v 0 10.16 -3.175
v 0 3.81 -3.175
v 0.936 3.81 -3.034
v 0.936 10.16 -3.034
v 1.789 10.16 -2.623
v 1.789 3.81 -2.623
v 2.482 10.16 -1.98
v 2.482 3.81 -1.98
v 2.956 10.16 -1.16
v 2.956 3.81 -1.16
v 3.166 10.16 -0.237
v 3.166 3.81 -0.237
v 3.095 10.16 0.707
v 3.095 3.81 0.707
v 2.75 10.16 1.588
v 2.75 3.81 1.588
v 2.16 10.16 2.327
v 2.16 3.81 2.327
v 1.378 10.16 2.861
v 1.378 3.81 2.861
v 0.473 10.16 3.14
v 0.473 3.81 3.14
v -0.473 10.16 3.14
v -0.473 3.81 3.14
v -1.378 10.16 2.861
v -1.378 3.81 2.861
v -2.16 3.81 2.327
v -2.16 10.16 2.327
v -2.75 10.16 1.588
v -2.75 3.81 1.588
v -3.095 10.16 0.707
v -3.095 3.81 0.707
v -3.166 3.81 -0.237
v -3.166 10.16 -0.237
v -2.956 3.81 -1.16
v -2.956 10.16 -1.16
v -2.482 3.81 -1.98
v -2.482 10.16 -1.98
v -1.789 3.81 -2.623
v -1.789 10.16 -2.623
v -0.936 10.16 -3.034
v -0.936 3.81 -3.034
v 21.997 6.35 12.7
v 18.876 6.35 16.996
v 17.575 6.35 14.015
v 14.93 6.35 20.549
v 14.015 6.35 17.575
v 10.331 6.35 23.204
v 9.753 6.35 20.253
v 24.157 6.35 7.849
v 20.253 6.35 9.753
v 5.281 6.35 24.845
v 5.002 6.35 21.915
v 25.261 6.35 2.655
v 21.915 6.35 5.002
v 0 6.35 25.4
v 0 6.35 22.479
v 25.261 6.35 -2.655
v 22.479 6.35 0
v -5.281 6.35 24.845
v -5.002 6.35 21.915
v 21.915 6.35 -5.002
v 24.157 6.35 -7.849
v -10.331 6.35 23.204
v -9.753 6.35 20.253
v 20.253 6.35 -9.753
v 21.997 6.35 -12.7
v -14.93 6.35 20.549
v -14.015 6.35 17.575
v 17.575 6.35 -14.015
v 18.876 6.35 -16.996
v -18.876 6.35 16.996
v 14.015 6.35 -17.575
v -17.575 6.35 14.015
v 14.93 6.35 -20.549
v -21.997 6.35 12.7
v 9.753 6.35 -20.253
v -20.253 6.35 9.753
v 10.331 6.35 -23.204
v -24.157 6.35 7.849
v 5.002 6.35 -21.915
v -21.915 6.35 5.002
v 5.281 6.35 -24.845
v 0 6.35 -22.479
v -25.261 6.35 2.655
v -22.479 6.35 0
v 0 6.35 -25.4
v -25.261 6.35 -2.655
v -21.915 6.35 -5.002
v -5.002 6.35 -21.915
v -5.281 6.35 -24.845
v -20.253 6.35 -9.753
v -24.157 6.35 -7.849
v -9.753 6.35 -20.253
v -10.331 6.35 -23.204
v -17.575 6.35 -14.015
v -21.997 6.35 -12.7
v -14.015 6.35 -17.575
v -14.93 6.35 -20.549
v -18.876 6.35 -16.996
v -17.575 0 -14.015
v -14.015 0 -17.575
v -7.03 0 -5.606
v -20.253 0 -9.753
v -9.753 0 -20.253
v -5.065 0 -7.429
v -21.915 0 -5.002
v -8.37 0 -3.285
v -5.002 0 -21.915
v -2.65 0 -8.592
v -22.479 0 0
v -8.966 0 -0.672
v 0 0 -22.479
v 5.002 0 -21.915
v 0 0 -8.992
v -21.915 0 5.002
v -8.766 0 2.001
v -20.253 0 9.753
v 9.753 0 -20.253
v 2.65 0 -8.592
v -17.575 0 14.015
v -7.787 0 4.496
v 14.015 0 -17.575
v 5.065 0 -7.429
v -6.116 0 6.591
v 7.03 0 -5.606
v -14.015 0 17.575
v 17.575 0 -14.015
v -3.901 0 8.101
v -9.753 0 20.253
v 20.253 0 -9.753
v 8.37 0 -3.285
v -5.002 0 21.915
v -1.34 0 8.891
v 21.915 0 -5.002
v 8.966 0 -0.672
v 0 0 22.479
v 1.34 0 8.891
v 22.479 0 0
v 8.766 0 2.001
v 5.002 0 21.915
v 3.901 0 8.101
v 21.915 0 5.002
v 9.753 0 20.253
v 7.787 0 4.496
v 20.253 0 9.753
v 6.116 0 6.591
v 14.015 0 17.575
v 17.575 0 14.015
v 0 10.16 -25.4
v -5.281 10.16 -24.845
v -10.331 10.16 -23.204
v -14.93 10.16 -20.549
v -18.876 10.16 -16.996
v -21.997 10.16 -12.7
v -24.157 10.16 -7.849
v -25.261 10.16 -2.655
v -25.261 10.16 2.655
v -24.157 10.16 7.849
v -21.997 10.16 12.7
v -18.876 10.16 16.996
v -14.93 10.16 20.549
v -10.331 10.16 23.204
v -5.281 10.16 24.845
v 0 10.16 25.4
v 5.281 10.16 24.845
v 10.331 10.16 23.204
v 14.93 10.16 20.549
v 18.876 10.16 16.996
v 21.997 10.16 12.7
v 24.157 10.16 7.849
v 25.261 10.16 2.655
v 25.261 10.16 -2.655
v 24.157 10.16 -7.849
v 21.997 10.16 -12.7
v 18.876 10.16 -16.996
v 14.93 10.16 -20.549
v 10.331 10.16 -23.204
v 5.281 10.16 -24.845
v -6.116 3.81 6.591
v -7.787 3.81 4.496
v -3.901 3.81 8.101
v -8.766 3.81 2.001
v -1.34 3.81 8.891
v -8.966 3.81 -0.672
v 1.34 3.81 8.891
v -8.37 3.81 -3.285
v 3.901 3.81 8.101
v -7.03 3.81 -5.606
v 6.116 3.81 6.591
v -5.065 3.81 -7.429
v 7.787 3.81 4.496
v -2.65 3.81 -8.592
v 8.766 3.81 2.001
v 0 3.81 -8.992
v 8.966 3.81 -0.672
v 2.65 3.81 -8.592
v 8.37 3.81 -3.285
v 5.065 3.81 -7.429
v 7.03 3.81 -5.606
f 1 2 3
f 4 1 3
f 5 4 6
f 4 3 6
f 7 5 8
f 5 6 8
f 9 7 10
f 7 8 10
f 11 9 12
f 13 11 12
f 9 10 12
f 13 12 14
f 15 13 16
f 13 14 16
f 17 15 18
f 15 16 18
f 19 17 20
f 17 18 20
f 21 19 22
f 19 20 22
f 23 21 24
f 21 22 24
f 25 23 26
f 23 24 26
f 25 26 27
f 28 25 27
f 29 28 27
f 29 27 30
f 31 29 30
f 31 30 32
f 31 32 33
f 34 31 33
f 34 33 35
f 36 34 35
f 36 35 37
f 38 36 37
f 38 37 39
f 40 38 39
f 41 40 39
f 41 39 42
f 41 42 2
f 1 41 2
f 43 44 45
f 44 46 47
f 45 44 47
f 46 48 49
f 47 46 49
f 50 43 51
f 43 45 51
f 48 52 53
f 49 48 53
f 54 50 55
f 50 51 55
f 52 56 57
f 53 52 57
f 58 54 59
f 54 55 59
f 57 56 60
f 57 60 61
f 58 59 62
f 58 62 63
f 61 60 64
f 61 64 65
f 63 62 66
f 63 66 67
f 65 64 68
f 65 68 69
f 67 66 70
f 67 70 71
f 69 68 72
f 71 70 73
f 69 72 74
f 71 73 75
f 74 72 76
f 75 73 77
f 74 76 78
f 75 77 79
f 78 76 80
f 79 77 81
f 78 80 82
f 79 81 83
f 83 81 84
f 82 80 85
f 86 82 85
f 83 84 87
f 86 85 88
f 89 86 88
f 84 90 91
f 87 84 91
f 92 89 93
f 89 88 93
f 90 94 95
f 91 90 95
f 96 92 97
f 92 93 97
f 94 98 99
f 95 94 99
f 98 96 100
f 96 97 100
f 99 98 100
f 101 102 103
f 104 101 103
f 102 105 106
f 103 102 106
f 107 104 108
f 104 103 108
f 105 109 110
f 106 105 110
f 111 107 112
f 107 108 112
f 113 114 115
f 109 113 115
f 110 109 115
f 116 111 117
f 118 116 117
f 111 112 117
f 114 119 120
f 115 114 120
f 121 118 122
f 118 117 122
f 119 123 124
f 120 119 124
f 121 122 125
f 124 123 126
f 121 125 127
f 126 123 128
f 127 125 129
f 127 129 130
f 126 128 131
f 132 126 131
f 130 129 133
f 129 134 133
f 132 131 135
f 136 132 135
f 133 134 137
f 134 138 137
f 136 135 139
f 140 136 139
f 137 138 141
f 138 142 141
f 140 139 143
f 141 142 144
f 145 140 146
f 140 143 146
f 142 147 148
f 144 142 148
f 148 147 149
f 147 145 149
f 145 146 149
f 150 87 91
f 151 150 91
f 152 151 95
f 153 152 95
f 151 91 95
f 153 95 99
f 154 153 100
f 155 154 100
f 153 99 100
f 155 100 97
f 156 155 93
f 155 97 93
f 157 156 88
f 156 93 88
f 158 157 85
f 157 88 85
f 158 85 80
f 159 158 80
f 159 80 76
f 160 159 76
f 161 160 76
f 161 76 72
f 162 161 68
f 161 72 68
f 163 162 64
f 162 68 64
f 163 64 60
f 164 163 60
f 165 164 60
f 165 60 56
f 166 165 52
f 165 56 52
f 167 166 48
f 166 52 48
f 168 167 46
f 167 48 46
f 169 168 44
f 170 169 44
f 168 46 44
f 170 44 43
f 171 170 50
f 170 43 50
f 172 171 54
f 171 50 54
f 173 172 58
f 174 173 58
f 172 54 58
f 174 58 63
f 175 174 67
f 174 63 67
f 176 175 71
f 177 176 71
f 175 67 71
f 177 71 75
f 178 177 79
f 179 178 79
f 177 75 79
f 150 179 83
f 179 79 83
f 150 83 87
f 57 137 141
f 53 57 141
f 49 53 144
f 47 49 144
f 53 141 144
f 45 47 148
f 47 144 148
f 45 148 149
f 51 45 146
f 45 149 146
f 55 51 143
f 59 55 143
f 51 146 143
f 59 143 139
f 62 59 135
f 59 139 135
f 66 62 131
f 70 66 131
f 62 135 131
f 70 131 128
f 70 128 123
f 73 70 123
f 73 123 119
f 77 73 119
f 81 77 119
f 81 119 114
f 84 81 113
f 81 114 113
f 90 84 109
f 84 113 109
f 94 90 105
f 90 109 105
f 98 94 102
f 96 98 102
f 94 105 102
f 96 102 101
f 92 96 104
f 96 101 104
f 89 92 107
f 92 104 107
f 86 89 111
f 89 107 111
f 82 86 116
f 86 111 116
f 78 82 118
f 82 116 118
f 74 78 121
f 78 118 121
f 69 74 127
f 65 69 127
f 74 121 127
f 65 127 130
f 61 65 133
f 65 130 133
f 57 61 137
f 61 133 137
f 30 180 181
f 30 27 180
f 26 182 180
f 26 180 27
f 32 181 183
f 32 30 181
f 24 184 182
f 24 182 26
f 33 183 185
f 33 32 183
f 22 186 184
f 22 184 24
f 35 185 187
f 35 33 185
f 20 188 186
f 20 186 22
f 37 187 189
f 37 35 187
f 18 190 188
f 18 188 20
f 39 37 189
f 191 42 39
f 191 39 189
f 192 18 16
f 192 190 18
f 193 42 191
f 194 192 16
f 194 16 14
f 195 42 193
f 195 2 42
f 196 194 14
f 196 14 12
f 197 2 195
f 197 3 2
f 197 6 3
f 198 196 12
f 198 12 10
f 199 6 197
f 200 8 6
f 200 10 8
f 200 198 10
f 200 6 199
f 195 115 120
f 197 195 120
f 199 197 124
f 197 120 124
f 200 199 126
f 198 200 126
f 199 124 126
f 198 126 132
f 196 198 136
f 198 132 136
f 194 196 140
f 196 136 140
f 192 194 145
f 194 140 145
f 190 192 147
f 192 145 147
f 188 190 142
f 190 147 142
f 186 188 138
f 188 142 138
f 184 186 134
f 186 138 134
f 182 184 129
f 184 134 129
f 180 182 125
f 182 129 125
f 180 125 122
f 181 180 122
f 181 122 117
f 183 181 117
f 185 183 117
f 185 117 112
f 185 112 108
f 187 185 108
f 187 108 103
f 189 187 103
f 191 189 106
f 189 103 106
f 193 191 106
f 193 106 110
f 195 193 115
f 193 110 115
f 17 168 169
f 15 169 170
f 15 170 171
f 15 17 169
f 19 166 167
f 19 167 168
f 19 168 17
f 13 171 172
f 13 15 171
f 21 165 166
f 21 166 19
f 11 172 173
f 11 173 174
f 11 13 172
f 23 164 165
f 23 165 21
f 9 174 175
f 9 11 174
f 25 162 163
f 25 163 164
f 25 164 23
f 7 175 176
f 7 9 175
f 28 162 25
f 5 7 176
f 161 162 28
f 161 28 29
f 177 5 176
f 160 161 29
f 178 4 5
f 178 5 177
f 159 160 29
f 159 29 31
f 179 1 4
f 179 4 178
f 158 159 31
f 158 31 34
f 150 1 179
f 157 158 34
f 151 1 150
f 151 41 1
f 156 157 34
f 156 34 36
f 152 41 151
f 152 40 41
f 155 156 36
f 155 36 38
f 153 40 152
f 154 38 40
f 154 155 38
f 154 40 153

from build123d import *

# Parameters (mm, degrees)
SKETCH1_R           = 22.479
BOSS_EXTRUDE1_DEPTH = 6.35
SKETCH2_R           = 25.4
BOSS_EXTRUDE2_DEPTH = 3.81
SKETCH3_R           = 8.9916
CUT_EXTRUDE1_DEPTH  = 3.81
SKETCH4_R           = 3.175
CUT_EXTRUDE2_DEPTH  = 37.477972806


with BuildPart() as part:
    # Sketch1 → Boss-Extrude1 (new body)
    with BuildSketch(Plane(origin=(0, 0, 0), x_dir=(1, 0, 0), z_dir=(0, 1, 0))):
        with Locations(Location((0, 0, 0), (0, 0, 270))):
            Circle(SKETCH1_R)
    extrude(amount=BOSS_EXTRUDE1_DEPTH)

    # Sketch2 → Boss-Extrude2 (add)
    with BuildSketch(Plane(origin=(0, 6.35, 0), x_dir=(1, 0, 0), z_dir=(0, 1, 0))):
        with Locations(Location((0, 0, 0), (0, 0, 90))):
            Circle(SKETCH2_R)
    extrude(amount=BOSS_EXTRUDE2_DEPTH)

    # Sketch3 → Cut-Extrude1 (cut)
    with BuildSketch(Plane.XZ):
        with Locations(Location((0, 0, 0), (0, 0, 270))):
            Circle(SKETCH3_R)
    extrude(amount=-CUT_EXTRUDE1_DEPTH, mode=Mode.SUBTRACT)

    # Sketch4 → Cut-Extrude2 (cut, through all)
    with BuildSketch(Plane.XZ.offset(-3.81)):
        with Locations(Location((0, 0, 0), (0, 0, 270))):
            Circle(SKETCH4_R)
    extrude(amount=-CUT_EXTRUDE2_DEPTH, mode=Mode.SUBTRACT)


solid = part.part
